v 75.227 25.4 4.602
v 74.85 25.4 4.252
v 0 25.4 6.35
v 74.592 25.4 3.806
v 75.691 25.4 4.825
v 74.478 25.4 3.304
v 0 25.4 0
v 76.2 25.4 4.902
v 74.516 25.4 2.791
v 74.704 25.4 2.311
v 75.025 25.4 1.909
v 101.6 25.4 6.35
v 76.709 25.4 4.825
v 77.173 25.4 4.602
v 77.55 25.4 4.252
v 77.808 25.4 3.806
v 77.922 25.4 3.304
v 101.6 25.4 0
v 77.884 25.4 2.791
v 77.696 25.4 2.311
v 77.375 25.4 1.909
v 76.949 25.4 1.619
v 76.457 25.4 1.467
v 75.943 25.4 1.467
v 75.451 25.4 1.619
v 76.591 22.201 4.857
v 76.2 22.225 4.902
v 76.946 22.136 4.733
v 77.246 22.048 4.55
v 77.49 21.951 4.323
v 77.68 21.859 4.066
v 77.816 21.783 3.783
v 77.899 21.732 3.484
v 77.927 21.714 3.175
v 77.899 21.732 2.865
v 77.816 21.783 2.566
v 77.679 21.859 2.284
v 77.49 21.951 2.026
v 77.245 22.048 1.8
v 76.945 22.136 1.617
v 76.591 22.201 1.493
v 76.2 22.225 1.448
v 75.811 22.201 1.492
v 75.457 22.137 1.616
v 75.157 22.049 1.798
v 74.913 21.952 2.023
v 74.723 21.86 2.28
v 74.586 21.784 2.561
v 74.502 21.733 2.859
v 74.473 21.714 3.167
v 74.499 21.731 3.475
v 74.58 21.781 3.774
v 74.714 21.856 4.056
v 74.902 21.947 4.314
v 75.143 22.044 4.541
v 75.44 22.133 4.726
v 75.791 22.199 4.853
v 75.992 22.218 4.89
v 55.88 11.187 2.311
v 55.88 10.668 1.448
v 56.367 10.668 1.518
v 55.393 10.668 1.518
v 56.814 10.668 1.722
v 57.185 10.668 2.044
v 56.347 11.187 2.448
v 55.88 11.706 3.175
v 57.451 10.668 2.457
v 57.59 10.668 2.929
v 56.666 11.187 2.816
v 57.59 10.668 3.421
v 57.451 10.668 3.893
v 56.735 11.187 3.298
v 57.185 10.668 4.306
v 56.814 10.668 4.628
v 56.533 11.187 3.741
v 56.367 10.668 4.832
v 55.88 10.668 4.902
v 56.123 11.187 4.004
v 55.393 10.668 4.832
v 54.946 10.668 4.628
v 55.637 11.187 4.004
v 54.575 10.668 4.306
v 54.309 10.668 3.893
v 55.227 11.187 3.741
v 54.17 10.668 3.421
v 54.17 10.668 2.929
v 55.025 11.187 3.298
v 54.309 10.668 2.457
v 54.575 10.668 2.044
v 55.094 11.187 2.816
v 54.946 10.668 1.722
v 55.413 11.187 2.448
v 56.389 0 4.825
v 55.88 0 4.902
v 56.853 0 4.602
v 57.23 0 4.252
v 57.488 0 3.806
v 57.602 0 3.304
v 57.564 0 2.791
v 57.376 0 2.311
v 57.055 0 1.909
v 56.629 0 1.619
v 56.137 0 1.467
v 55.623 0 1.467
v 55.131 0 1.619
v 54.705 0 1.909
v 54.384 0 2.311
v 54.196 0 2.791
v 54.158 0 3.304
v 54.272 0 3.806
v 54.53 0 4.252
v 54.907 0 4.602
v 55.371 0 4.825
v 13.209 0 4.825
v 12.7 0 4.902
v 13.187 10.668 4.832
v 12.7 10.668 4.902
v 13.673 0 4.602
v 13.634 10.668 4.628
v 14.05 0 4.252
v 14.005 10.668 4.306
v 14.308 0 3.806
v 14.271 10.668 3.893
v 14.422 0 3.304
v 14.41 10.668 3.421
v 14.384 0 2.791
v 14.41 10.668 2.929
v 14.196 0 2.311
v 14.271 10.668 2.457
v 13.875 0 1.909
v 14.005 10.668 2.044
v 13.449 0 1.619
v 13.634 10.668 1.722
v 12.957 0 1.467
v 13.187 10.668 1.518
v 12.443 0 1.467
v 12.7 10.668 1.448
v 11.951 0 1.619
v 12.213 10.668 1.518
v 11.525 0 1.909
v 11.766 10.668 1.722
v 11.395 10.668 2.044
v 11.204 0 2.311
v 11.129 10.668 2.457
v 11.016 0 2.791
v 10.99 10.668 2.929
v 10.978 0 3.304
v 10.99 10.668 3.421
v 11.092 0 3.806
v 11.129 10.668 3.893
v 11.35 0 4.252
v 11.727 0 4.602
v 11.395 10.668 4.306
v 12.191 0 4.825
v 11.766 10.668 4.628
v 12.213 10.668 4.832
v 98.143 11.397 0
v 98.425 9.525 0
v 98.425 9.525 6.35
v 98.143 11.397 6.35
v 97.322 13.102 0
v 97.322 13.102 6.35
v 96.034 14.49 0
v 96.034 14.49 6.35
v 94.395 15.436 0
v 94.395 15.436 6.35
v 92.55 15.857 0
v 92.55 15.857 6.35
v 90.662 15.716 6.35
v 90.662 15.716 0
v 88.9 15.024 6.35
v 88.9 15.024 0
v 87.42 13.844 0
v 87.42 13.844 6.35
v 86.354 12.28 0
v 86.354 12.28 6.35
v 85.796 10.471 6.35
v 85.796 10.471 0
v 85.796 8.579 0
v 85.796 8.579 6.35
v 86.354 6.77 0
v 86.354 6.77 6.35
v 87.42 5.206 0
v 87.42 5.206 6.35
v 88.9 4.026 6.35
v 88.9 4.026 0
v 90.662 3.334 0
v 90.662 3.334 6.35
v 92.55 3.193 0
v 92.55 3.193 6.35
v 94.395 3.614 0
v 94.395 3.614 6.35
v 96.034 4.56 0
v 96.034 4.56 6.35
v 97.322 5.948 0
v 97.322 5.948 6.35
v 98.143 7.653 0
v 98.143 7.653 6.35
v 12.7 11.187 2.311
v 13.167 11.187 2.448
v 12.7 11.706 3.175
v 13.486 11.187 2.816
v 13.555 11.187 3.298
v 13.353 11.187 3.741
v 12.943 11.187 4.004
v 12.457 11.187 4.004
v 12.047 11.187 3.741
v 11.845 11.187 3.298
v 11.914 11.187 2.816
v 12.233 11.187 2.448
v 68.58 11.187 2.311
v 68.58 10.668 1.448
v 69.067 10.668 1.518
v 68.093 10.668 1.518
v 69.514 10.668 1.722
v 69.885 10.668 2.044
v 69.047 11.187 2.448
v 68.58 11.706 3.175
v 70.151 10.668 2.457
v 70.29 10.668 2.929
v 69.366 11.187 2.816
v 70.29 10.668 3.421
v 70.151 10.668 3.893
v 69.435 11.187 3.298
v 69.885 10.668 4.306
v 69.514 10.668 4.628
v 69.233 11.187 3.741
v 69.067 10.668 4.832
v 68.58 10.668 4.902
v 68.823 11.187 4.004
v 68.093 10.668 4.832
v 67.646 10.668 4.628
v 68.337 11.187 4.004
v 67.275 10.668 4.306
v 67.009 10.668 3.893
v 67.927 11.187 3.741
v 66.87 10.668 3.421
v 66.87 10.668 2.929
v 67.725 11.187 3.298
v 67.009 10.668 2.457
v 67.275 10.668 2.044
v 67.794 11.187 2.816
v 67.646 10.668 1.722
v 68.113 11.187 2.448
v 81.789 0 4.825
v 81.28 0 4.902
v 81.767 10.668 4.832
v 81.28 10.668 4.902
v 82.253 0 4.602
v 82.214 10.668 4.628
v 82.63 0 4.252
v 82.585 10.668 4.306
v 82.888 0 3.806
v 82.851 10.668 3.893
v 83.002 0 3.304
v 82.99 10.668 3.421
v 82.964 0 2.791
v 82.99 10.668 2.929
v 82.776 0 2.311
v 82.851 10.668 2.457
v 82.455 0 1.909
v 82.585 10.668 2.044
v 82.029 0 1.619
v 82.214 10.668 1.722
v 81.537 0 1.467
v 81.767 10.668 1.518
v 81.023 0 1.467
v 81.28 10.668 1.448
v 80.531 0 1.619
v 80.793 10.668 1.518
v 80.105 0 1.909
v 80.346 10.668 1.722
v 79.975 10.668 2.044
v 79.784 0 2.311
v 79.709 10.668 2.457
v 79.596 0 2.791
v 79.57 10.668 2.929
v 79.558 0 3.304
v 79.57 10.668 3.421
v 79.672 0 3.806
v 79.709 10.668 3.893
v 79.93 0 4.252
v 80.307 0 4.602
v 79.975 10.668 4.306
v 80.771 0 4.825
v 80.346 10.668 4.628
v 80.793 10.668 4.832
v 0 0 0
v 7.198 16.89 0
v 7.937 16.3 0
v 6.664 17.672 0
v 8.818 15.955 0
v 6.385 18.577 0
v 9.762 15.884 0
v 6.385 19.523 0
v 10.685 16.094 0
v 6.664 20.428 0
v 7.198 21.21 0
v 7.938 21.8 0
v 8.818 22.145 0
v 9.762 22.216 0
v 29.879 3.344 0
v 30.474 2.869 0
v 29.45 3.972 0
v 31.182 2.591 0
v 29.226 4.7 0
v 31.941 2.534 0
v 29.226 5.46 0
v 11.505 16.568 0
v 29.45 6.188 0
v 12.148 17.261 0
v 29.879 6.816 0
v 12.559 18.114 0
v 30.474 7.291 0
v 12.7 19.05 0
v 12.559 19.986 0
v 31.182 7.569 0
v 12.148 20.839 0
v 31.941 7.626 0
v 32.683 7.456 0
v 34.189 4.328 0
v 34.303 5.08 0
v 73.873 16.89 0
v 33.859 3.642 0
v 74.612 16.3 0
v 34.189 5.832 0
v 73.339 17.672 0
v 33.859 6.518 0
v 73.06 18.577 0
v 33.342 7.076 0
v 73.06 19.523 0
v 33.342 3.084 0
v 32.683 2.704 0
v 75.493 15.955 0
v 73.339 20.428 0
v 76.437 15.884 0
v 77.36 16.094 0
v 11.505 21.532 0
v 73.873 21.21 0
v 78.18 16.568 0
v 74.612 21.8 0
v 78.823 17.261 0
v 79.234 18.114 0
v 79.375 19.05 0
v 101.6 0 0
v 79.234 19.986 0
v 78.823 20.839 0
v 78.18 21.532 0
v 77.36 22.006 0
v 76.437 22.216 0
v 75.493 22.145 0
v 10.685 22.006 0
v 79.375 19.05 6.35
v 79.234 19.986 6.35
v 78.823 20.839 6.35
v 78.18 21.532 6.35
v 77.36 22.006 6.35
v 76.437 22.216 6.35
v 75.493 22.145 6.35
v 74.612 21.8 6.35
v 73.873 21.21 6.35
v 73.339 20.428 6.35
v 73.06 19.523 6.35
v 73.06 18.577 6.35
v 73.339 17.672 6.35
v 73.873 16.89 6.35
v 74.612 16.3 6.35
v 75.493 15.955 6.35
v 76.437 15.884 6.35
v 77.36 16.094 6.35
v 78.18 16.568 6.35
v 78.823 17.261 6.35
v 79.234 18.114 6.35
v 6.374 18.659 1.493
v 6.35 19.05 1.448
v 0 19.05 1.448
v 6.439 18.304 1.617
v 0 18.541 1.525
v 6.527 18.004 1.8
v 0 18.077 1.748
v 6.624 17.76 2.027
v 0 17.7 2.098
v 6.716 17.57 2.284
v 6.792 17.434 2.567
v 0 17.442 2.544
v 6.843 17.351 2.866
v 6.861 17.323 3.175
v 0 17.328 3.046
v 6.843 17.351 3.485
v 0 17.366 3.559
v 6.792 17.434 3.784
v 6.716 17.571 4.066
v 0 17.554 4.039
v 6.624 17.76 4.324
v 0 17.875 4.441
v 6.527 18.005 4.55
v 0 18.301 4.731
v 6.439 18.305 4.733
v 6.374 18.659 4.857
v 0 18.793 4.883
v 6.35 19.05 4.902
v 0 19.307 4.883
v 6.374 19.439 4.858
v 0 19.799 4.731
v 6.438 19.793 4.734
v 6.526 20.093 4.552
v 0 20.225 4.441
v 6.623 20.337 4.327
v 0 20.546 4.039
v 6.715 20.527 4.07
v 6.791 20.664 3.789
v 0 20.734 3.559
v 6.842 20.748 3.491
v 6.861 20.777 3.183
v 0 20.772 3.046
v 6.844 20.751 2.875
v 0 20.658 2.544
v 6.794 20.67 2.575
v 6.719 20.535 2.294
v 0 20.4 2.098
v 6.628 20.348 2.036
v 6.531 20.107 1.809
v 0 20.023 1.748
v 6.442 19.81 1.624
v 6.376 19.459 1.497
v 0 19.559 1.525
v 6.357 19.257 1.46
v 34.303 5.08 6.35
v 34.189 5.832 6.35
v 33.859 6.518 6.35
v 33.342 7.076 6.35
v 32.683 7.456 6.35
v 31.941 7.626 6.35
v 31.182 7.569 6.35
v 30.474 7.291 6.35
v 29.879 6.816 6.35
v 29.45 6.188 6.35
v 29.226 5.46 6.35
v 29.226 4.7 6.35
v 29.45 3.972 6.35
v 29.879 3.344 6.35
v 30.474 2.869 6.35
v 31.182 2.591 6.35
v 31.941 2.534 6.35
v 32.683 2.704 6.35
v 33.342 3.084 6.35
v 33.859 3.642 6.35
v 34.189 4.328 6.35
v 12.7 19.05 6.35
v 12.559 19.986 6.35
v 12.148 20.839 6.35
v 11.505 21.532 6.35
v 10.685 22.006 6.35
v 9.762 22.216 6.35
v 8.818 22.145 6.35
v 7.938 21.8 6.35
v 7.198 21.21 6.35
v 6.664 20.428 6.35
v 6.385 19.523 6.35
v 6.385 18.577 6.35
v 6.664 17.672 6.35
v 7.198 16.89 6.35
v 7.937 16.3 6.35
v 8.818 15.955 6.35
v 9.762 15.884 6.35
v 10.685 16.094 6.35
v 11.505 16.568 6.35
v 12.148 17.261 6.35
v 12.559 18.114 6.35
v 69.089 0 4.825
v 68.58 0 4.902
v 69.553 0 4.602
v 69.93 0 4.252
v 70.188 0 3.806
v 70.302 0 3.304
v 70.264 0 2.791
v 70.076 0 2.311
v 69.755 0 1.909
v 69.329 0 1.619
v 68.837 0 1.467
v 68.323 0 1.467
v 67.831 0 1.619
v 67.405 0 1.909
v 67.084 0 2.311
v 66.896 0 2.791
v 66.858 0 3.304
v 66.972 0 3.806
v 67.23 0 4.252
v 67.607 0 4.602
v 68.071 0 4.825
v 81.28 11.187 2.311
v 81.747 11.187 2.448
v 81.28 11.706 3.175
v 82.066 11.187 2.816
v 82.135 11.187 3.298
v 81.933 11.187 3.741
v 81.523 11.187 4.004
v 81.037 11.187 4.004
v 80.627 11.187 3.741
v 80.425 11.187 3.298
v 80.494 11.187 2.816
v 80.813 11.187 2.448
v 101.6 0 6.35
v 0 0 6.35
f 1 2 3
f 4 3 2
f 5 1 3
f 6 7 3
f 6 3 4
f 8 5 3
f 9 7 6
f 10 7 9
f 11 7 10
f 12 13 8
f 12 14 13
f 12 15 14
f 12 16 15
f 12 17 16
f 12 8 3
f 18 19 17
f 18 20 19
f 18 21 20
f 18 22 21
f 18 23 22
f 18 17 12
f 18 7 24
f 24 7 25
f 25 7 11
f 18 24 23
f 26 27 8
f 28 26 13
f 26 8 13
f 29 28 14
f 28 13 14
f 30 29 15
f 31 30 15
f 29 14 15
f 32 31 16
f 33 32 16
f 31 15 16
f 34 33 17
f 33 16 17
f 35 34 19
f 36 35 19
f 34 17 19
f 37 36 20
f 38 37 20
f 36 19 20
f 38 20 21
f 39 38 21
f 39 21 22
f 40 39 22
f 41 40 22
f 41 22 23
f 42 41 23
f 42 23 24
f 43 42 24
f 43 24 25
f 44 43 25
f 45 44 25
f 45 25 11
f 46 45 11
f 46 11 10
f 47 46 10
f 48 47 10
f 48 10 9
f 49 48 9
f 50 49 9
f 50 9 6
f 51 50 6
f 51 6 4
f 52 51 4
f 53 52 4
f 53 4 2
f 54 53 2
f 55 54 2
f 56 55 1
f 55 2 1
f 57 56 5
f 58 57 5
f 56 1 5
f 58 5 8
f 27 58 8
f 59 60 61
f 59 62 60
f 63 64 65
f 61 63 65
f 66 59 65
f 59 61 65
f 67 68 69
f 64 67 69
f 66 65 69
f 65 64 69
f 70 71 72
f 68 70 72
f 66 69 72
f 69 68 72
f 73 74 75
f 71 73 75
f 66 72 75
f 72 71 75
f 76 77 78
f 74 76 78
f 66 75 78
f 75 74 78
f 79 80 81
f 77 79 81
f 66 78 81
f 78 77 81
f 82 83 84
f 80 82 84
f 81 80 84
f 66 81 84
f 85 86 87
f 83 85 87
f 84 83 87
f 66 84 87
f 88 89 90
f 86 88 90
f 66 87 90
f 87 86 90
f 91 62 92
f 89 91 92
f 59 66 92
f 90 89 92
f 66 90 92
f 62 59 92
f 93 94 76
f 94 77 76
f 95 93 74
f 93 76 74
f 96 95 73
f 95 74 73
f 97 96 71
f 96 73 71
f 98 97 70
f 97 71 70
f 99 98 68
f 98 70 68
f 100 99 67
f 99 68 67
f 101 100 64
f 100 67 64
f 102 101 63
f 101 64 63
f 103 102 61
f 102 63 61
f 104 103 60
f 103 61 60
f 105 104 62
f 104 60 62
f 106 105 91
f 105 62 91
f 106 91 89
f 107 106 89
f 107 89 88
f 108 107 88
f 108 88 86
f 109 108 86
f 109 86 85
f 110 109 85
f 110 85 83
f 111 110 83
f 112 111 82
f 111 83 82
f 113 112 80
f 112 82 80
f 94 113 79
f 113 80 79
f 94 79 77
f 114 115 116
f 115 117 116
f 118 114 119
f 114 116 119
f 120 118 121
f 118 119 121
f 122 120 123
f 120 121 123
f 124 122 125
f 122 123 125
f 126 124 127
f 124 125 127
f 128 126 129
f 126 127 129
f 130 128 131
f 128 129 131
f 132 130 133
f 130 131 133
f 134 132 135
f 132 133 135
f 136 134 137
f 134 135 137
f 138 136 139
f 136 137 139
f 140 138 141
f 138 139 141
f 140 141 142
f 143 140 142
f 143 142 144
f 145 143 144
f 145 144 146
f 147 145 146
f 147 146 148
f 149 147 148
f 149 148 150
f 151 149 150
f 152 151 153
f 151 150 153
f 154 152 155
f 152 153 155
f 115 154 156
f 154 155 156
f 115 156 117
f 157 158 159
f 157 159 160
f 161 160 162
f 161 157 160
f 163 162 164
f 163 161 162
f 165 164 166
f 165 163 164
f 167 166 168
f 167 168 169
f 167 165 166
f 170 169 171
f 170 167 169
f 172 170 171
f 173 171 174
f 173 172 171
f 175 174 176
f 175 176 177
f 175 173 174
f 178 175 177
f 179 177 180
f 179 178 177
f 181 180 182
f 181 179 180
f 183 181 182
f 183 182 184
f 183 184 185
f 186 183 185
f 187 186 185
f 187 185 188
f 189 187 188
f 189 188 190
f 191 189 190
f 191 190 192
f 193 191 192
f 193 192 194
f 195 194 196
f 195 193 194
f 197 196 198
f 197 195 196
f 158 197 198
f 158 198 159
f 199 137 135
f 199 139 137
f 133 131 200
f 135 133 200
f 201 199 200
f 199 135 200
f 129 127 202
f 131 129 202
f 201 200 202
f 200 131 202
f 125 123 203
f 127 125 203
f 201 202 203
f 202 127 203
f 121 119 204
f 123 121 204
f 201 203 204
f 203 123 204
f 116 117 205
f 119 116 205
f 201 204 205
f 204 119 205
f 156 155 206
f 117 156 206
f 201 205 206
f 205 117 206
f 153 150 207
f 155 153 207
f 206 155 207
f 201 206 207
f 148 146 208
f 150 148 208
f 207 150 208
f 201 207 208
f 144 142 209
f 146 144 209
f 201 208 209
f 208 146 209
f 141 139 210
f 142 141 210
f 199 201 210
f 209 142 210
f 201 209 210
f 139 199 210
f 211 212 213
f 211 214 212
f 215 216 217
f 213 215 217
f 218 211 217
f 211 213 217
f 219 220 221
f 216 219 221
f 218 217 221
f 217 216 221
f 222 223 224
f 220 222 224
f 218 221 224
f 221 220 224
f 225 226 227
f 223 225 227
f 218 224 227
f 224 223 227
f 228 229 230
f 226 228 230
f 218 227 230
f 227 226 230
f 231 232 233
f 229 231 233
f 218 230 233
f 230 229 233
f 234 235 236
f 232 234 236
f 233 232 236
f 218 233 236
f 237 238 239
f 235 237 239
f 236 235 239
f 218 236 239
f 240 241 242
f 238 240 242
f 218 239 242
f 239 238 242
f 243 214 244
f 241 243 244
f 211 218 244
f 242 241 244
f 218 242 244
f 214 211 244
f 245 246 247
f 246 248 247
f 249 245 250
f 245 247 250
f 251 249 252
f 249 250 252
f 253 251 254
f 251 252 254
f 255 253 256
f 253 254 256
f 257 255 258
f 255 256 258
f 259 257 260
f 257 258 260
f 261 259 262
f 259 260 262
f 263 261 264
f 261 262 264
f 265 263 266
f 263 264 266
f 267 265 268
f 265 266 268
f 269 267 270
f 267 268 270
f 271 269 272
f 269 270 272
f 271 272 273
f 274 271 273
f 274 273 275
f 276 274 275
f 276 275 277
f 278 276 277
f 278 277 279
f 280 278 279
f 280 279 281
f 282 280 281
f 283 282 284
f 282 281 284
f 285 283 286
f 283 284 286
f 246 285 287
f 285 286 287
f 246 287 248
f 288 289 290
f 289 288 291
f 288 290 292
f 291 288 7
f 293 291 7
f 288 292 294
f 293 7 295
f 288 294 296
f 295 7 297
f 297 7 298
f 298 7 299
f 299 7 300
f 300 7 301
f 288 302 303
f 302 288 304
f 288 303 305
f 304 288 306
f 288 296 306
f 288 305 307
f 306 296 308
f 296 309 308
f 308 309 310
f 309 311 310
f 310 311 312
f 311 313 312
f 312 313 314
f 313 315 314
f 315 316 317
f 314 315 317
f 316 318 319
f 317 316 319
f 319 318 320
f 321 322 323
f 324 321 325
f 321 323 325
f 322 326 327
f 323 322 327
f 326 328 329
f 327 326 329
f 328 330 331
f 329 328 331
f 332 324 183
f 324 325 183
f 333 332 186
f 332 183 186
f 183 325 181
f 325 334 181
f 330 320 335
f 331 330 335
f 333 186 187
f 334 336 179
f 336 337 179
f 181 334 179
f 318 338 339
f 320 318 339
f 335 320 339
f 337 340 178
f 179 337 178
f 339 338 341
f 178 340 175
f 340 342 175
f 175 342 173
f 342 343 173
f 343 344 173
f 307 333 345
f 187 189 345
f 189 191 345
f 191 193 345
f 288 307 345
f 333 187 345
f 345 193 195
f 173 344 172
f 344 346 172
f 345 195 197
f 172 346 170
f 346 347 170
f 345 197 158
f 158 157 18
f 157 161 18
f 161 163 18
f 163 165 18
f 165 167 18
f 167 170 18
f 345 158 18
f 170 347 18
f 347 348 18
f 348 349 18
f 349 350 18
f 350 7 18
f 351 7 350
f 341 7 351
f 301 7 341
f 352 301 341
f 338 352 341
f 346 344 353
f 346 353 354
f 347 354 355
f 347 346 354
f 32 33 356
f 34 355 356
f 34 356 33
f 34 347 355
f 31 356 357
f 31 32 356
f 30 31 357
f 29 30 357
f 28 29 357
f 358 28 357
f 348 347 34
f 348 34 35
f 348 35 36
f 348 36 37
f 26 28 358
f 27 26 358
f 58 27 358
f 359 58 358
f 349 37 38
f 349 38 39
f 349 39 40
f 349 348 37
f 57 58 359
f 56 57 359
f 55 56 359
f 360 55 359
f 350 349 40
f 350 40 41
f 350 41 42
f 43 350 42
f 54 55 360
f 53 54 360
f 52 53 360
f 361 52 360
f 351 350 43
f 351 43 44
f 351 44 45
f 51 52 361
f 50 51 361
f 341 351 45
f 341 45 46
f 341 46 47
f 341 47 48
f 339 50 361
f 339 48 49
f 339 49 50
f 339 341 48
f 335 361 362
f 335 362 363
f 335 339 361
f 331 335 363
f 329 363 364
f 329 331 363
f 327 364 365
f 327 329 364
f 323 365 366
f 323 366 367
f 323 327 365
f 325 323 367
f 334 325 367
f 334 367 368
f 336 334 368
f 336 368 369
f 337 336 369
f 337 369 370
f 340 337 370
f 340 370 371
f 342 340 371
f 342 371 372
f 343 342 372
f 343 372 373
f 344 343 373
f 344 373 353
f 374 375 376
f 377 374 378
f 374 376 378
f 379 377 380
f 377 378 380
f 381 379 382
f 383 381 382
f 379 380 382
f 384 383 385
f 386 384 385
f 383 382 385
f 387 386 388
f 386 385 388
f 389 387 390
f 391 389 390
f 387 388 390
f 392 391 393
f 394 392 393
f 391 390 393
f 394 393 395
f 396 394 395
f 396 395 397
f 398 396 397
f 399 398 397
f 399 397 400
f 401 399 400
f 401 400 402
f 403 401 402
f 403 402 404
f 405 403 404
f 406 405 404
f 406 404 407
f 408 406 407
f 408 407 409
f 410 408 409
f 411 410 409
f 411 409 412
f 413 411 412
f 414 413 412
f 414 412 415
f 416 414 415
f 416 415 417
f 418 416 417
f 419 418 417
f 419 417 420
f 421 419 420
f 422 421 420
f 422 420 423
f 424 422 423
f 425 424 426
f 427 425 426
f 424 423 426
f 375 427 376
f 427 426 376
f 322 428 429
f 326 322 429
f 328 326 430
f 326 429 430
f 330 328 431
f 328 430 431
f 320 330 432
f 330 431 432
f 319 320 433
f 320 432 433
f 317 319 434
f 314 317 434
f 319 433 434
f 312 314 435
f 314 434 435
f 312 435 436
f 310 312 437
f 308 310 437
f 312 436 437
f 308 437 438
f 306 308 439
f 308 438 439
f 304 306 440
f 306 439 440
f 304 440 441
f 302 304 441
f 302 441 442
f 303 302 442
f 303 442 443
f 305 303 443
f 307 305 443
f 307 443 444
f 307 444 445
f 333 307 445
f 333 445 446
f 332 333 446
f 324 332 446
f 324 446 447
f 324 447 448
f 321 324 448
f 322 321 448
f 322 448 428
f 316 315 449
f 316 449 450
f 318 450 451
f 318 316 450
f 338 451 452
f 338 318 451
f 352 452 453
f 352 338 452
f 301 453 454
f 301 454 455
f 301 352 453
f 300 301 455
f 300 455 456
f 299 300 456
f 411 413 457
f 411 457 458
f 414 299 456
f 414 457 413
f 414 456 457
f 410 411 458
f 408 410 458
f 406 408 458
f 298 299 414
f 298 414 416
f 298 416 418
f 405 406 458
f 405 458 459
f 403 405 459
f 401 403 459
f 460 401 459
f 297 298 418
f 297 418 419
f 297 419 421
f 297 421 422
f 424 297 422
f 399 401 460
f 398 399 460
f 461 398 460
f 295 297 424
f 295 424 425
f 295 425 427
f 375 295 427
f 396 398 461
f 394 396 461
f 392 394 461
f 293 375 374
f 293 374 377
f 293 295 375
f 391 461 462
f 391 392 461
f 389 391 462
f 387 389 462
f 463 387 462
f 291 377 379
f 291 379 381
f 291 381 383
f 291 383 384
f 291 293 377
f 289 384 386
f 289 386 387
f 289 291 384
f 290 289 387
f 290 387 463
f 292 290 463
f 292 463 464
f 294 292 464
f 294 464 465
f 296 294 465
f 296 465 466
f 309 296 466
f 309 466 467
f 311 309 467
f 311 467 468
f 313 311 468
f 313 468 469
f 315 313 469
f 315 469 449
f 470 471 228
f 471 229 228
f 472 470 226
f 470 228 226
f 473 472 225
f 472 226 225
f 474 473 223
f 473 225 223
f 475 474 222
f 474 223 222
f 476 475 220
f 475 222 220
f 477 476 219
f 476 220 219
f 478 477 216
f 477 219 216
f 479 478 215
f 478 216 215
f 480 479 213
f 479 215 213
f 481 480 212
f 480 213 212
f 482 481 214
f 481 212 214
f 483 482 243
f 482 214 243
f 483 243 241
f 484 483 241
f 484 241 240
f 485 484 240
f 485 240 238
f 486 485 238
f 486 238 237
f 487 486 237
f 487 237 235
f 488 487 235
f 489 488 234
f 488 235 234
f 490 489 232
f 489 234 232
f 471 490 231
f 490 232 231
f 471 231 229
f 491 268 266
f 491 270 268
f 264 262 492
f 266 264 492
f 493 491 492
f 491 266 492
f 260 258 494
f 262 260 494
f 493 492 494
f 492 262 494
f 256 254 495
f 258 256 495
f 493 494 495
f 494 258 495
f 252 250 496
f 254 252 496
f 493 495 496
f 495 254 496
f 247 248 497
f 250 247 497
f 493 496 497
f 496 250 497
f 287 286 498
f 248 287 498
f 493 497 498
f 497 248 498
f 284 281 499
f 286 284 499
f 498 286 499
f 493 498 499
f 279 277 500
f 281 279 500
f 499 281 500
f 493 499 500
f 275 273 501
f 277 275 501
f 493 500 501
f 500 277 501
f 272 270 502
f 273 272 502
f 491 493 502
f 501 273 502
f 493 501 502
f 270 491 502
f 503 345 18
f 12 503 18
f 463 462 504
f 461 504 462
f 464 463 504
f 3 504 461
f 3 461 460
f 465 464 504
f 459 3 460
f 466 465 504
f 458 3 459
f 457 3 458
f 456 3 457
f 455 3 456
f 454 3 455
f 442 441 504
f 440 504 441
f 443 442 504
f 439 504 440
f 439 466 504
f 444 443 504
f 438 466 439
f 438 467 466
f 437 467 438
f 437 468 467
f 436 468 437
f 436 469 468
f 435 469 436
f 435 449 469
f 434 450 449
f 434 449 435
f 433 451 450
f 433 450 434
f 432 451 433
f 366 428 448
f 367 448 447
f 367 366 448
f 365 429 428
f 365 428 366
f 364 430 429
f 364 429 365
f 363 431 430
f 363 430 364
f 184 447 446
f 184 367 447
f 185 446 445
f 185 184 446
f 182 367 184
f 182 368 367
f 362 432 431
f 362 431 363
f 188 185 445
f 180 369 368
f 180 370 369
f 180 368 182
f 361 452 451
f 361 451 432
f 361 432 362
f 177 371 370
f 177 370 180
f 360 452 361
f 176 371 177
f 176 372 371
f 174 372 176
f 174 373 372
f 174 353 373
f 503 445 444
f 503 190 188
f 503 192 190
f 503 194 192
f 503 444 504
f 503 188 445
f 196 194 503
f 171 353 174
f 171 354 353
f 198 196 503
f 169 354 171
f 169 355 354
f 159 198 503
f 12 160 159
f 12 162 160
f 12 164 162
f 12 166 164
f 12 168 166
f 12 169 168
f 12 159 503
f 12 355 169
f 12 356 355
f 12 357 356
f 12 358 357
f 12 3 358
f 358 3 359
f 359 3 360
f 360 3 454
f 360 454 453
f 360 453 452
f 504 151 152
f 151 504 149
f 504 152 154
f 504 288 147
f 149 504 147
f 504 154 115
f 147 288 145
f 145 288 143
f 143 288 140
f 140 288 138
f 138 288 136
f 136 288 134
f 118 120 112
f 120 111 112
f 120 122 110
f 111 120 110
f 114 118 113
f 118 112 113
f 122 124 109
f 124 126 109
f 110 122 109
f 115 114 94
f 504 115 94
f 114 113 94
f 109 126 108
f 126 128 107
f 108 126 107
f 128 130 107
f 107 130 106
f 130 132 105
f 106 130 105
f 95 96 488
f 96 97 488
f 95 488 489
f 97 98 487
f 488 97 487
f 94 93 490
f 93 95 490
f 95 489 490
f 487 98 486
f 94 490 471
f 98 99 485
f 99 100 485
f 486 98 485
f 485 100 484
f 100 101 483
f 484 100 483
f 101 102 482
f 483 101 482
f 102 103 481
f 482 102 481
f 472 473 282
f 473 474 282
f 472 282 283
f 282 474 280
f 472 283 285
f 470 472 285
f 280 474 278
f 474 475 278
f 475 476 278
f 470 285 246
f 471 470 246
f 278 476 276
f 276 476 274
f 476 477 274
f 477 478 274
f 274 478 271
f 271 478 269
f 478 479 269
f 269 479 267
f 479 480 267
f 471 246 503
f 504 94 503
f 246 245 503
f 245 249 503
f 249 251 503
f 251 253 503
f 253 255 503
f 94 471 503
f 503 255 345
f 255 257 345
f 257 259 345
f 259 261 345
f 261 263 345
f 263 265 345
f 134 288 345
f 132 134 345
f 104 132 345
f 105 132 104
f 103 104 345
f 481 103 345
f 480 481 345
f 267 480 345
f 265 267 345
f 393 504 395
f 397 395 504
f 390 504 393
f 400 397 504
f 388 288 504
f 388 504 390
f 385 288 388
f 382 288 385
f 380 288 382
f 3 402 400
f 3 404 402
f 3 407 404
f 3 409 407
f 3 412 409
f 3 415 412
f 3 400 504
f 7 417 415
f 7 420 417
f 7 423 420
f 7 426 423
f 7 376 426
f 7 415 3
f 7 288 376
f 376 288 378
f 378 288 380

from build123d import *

# Parameters (mm, degrees)
SKETCH1_W                           = 101.6
SKETCH1_H                           = 25.4
SKETCH1_R                           = 6.35
SKETCH1_R_2                         = 3.175
BOSS_EXTRUDE1_DEPTH                 = 6.35
F_8_32_TAPPED_HOLE1_REACH           = 105.419
F_8_32_TAPPED_HOLE1_BORE_R          = 1.7272
F_8_32_TAPPED_HOLE1_ON_FACE_2_REACH = 82.385
F_8_32_TAPPED_HOLE1_BORE_2_R        = 1.7272
F_8_32_TAPPED_HOLE2_D               = 3.4544
F_8_32_TAPPED_HOLE2_DEPTH           = 10.668
F_8_32_TAPPED_HOLE2_TIP             = 1.037806461
F_1_4_20_TAPPED_HOLE1_D             = 5.1054


with BuildPart() as part:
    # Sketch1 → Boss-Extrude1 (new body)
    with BuildSketch(Plane.XY):
        with Locations((50.8, 12.7)):
            Rectangle(SKETCH1_W, SKETCH1_H)
        with Locations((92.075, 9.525)):
            Circle(SKETCH1_R, mode=Mode.SUBTRACT)
        with Locations((9.525, 19.05)):
            Circle(SKETCH1_R_2, mode=Mode.SUBTRACT)
        with Locations((76.2, 19.05)):
            Circle(SKETCH1_R_2, mode=Mode.SUBTRACT)
    extrude(amount=BOSS_EXTRUDE1_DEPTH)

    # #8-32 Tapped Hole1 bore (on position points) → #8-32 Tapped Hole1 (cut, up to next)
    with BuildSketch(Plane(origin=(0, 19.05, 3.175), x_dir=(0, 0, -1), z_dir=(-1, 0, 0)), mode=Mode.PRIVATE) as f_8_32_tapped_hole1_sk1:
        Circle(F_8_32_TAPPED_HOLE1_BORE_R)
    f_8_32_tapped_hole1_tool1 = extrude(f_8_32_tapped_hole1_sk1.sketch, amount=-F_8_32_TAPPED_HOLE1_REACH, mode=Mode.PRIVATE) & part.part
    add(f_8_32_tapped_hole1_tool1.solids().sort_by_distance((0, 19.05, 3.175))[0], mode=Mode.SUBTRACT)

    # #8-32 Tapped Hole1 bore 2 (on position points) → #8-32 Tapped Hole1 on face 2 (cut, up to next)
    with BuildSketch(Plane(origin=(76.2, 25.4, 3.175), x_dir=(0, 0, 1), z_dir=(0, 1, 0)), mode=Mode.PRIVATE) as f_8_32_tapped_hole1_on_face_2_sk1:
        Circle(F_8_32_TAPPED_HOLE1_BORE_2_R)
    f_8_32_tapped_hole1_on_face_2_tool1 = extrude(f_8_32_tapped_hole1_on_face_2_sk1.sketch, amount=-F_8_32_TAPPED_HOLE1_ON_FACE_2_REACH, mode=Mode.PRIVATE) & part.part
    add(f_8_32_tapped_hole1_on_face_2_tool1.solids().sort_by_distance((76.2, 25.4, 3.175))[0], mode=Mode.SUBTRACT)

    # #8-32 Tapped Hole2
    with Locations(Plane(origin=(81.28, 0, 3.175), x_dir=(0, 0, -1), z_dir=(0, -1, 0))):
        with Locations((0, 0), (0, -25.4), (0, -68.58), (0, -12.7)):
            Hole(F_8_32_TAPPED_HOLE2_D / 2, depth=F_8_32_TAPPED_HOLE2_DEPTH)
            with Locations((0, 0, -(F_8_32_TAPPED_HOLE2_DEPTH + F_8_32_TAPPED_HOLE2_TIP / 2))):  # 118° drill point
                Cone(0, F_8_32_TAPPED_HOLE2_D / 2, F_8_32_TAPPED_HOLE2_TIP, mode=Mode.SUBTRACT)

    # 1/4-20 Tapped Hole1 (through all)
    with Locations(Plane(origin=(31.75, 5.08, 0), x_dir=(-1, 0, 0), z_dir=(0, 0, -1))):
        with Locations((0, 0)):
            Hole(F_1_4_20_TAPPED_HOLE1_D / 2)


solid = part.part
